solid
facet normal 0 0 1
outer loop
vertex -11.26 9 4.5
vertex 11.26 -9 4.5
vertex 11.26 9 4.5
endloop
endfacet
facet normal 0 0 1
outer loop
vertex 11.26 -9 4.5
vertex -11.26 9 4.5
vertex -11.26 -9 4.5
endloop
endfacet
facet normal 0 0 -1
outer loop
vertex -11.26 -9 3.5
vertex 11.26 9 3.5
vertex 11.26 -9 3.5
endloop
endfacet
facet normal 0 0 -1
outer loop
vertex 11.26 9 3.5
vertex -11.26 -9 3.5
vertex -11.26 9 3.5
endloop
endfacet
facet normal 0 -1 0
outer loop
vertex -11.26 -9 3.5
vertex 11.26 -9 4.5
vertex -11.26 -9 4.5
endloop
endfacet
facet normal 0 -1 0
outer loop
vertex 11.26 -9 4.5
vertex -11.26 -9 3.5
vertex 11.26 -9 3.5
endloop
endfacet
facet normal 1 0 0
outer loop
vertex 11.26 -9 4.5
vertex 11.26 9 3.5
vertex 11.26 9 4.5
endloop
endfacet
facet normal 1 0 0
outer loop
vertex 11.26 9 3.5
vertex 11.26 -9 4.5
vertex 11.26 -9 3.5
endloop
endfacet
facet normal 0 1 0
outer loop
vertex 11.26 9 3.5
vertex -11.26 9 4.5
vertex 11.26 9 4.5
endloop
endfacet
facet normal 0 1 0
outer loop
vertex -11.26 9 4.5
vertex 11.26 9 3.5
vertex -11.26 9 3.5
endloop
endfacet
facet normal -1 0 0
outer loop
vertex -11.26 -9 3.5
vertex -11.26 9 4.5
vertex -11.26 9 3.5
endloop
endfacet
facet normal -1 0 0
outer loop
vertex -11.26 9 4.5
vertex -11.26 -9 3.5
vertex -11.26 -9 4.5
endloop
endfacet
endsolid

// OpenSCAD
// file: ../board-pocket.scad
//-----------------------------------------------------------------------
// Board pocket: holds a board that has no mounting holes
//
// The board sits on a central pedestal with a pad of double-sided foam tape
// on top, inside a low wall that follows its outline. The pedestal keeps
// the board's edges off the floor, so lead stubs soldered through the edge
// holes have room underneath; gaps in the wall let the leads out. The wall
// only locates the board: the tape holds it down, and in a closed box a lid
// pad presses a pad of foam onto it (boardLidPad below).
//
// Modules, all in the same frame:
//   boardPocketGhost()   the board and its tape, for previews
//   boardPocketHolder()  the plastic: pedestal and outline wall, add to the floor
//   boardLidPad()        a block hanging from the lid that presses foam onto the board
//   boardLidPadGhost()   the foam under it, squashed, for previews
//
// Frame: origin on the floor top, under the centre of the board's outline.
// X along the board's length l, Y across its width w, Z up. Units: mm.
//
// Sides are listed [-X, +X, -Y, +Y], each one of
//   "gap"    wall with a gap in the middle for leads (gapW wide)
//   "solid"  whole wall: use it where the board takes a push (a plug)
//   "open"   no wall: the board's edge goes into a box wall (a USB port)
//
// Used by esp32-c3-supermini, esp32-s3-devkitc and rs485-max485.
//-----------------------------------------------------------------------

//-- From the controller project's receiver.scad / rack-end.scad (boardPocket), 2026-10-30
bpPedestal  = 2.5;     // floor to the tape: room for lead stubs under the board edges
bpTape      = 1.0;     // double-sided foam tape on the pedestal. CAL: how far it squashes
bpWall      = 1.2;     // outline wall thickness
bpRise      = 1.0;     // wall top above the PCB underside (the controller project's rack-end: 0.8 under the S3's module)
bpClearance = 0.4;     // per side, board outline to wall: PETG. 0.3 for PLA. Set by the fit piece
bpGapW      = 6;       // lead gap in a "gap" side
bpPadInset  = 4;       // default pedestal: the board less this all round

//-- Lid hold-down (the controller project's receiver / rack-end lid pads)
bpFoam      = 3.0;     // CAL: self-adhesive foam stuck under each lid pad
bpSqueeze   = 1.0;     // how far the lid squashes it: ~1/3 for soft foam, 0.3 for felt

//-- PCB underside above the floor top
function boardPocketZ(pedestal = bpPedestal, tape = bpTape) = pedestal + tape;
//-- default pedestal [l, w] for a board
function boardPocketPad(l, w, inset = bpPadInset) = [max(l - 2*inset, 4), max(w - 2*inset, 4)];
//-- Z of a lid pad's underside, pressing on a surface at surfaceZ (board top, or a part on it)
function boardLidPadZ(surfaceZ, foam = bpFoam, squeeze = bpSqueeze) =
  assert(squeeze > 0 && squeeze < foam, "foam would not touch the board")
  surfaceZ + foam - squeeze;

function bpSides4(s) = is_list(s) ? s : [s, s, s, s];

module boardPocketGhost(l, w, pcb = 1.6, pad, pedestal = bpPedestal, tape = bpTape)
{
  p = is_undef(pad) ? boardPocketPad(l, w) : pad;
  %color("White") translate([-p[0]/2, -p[1]/2, pedestal]) cube([p[0], p[1], tape]);
  %color("DarkGreen") translate([-l/2, -w/2, pedestal + tape]) cube([l, w, pcb]);
}

//-- pad: pedestal [l, w]; gapW a number or one per side
module boardPocketHolder(l, w, pad, sides = "gap", gapW = bpGapW, clearance = bpClearance,
                         pedestal = bpPedestal, tape = bpTape, wall = bpWall, rise = bpRise)
{
  p   = is_undef(pad) ? boardPocketPad(l, w) : pad;
  s   = bpSides4(sides);
  g   = bpSides4(gapW);
  ix  = l/2 + clearance;                 // inner half sizes
  iy  = w/2 + clearance;
  top = pedestal + tape + rise;
  assert(p[0] <= l && p[1] <= w, "pedestal bigger than the board");
  for (k = s) assert(k == "gap" || k == "solid" || k == "open", str("unknown side ", k));

  //-- pedestal, centred under the board
  translate([-p[0]/2, -p[1]/2, -0.01]) cube([p[0], p[1], pedestal + 0.01]);
  //-- outline wall
  difference()
  {
    translate([-ix - wall, -iy - wall, -0.01]) cube([2*(ix + wall), 2*(iy + wall), top + 0.01]);
    translate([-ix, -iy, -1]) cube([2*ix, 2*iy, top + 2]);
    for (i = [0 : 3])
    {
      //-- each side's cut, drawn for -X then turned into place
      ax = (i < 2) ? ix : iy;         // inner half size across the side
      al = (i < 2) ? iy : ix;         // half length along it
      rotate([0, 0, [0, 180, 90, 270][i]])   // -X, +X, -Y, +Y
      {
        if (s[i] == "gap")
          translate([-ax - wall - 1, -g[i]/2, -1]) cube([wall + 2, g[i], top + 2]);
        if (s[i] == "open")
          translate([-ax - wall - 1, -al - wall - 1, -1]) cube([wall + 1.01, 2*(al + wall + 1), top + 2]);
      }
    }
  }
}

//-- A lid pad over the rectangle size [x, y] centred at `at`, from the squashed foam up to
//-- lidZ (the lid's inner face in this frame), running `into` up into the lid plate
module boardLidPad(size, at = [0, 0], surfaceZ, lidZ, foam = bpFoam, squeeze = bpSqueeze, into = 0.5)
{
  z0 = boardLidPadZ(surfaceZ, foam, squeeze);
  assert(lidZ > z0, "lid is below the pad: the box is too low for the foam");
  translate([at[0] - size[0]/2, at[1] - size[1]/2, z0]) cube([size[0], size[1], lidZ - z0 + into]);
}

module boardLidPadGhost(size, at = [0, 0], surfaceZ, foam = bpFoam, squeeze = bpSqueeze)
{
  %color("Gray") translate([at[0] - size[0]/2, at[1] - size[1]/2, surfaceZ]) cube([size[0], size[1], foam - squeeze]);
}
// main file
// The board (and its tape) as solids, for the catalogue. part = "board" | "tape" | "foam"
include <../board-pocket.scad>

l = 22.52; w = 18; pcb = 1.0; pad = [14, 10];
part = "board";
z = boardPocketZ();
if (part == "board") translate([-l/2, -w/2, z]) cube([l, w, pcb]);
if (part == "tape")  translate([-pad[0]/2, -pad[1]/2, bpPedestal + 0.01]) cube([pad[0], pad[1], bpTape - 0.02]);   // 0.01 clear of the pedestal and board
//-- the foam under the lid pad, squashed
if (part == "foam")  translate([-l/2 + 1, -w/2 + 3, z + pcb]) cube([5, w - 6, bpFoam - bpSqueeze - 0.01]);
